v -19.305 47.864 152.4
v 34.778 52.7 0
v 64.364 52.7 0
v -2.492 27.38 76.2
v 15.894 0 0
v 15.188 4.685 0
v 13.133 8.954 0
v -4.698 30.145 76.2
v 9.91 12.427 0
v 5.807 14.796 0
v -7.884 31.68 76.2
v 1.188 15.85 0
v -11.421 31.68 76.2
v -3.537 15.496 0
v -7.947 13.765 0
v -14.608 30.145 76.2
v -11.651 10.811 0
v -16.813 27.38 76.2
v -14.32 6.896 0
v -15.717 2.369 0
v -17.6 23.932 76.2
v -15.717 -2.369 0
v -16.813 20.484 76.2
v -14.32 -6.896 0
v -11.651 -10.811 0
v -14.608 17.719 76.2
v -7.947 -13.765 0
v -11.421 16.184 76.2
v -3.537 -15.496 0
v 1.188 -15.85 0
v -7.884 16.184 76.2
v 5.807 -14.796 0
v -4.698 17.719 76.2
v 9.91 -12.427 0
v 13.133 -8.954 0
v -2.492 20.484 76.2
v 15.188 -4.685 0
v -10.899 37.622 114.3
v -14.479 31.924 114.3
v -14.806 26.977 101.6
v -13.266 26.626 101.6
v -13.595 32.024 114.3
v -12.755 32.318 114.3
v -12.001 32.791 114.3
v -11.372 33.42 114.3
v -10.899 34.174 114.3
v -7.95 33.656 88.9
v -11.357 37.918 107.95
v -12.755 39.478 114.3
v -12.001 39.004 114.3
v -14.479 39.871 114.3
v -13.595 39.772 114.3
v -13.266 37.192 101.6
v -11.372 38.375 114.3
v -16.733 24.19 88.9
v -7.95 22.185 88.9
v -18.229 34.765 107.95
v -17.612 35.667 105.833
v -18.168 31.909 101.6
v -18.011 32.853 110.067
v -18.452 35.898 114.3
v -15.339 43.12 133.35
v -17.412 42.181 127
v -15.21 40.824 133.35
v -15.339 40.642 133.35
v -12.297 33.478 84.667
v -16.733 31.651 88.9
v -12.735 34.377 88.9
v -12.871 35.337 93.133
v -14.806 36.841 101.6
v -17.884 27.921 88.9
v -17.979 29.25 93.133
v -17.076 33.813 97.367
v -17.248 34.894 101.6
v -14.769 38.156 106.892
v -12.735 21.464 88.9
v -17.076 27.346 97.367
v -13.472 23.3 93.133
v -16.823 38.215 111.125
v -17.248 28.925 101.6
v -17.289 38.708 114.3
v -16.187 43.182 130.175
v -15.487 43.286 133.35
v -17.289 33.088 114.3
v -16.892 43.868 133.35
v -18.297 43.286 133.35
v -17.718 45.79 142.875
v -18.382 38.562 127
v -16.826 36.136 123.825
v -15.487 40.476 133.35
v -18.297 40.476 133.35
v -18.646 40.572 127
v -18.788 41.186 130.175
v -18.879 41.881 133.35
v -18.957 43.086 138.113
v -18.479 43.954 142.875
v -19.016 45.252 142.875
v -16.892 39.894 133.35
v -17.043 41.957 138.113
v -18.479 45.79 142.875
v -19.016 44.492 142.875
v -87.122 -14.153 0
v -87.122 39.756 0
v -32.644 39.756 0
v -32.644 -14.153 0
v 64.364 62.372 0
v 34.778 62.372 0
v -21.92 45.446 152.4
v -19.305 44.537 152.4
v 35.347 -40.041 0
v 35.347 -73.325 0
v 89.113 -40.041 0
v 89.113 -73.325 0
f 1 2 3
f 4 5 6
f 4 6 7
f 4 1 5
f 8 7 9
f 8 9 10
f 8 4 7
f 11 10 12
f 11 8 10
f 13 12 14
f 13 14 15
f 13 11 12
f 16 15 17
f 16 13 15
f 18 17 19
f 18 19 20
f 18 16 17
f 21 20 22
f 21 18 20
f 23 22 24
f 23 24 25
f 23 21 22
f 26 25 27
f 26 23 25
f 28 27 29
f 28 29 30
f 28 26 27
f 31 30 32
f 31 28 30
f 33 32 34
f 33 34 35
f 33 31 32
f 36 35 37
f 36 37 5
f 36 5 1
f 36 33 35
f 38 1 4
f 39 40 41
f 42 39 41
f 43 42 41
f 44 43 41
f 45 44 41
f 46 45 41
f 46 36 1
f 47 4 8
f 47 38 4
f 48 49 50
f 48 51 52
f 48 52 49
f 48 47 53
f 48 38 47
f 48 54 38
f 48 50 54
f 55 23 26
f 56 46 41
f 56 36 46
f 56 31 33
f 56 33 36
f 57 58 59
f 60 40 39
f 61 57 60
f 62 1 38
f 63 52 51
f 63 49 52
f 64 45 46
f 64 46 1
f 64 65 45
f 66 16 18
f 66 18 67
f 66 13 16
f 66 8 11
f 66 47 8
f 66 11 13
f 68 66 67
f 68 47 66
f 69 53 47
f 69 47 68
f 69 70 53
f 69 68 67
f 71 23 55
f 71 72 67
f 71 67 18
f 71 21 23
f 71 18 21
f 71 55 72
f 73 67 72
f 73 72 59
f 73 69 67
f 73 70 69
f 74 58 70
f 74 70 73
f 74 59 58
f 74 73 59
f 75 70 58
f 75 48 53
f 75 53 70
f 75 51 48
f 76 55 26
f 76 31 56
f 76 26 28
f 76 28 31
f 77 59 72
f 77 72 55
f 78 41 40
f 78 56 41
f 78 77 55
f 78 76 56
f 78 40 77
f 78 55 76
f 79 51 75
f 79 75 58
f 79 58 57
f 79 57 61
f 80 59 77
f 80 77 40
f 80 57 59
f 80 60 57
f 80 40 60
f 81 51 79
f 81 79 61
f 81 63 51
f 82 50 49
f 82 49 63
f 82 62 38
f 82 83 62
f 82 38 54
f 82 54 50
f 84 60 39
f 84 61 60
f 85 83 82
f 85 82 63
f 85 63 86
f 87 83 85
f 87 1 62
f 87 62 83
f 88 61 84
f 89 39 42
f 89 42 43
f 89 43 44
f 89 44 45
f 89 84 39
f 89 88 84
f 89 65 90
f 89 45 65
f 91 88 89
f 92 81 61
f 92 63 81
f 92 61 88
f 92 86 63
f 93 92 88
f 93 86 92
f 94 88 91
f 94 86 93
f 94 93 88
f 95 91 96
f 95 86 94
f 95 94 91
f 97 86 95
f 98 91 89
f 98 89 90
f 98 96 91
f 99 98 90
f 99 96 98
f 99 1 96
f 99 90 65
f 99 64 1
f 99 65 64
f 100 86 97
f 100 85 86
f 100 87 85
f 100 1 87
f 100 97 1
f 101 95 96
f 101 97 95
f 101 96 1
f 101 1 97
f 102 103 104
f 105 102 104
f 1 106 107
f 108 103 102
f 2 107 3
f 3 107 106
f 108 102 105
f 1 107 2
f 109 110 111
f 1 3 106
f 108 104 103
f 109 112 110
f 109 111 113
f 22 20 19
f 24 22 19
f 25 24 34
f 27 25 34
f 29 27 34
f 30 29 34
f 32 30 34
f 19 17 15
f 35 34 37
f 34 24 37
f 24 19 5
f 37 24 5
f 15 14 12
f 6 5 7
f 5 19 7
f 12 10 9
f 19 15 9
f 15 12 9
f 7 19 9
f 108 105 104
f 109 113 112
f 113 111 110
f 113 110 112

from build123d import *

# Parameters (mm, degrees)
F0_W   = 53.766724
F0_H   = 33.284154
F0_W_2 = 54.477919
F0_H_2 = 53.908958
F0_R   = 15.894327
F0_W_3 = 29.585917
F0_H_3 = 9.672321


with BuildPart() as f3:
    # F0 (on Top) → F3 section 0
    with BuildSketch(Plane.XY, mode=Mode.PRIVATE) as f3_s0:
        with Locations((62.23, -56.682641)):
            Rectangle(F0_W, F0_H)
    loft([f3_s0.sketch, Vertex(-19.305075, 44.537269, 152.4)])


with BuildPart() as f4:
    # F0 (on Top) → F4 section 0
    with BuildSketch(Plane.XY, mode=Mode.PRIVATE) as f4_s0:
        with Locations((-59.883041, 12.801599)):
            Rectangle(F0_W_2, F0_H_2)
    loft([f4_s0.sketch, Vertex(-21.920199, 45.445681, 152.4)])


with BuildPart() as f5:
    # F0 (on Top) → F5 section 0
    with BuildSketch(Plane.XY, mode=Mode.PRIVATE) as f5_s0:
        Circle(F0_R)
    loft([f5_s0.sketch, Vertex(-19.305075, 47.863759, 152.4)])


with BuildPart() as f6:
    # F0 (on Top) → F6 section 0
    with BuildSketch(Plane.XY, mode=Mode.PRIVATE) as f6_s0:
        with Locations((49.57064, 57.53608)):
            Rectangle(F0_W_3, F0_H_3)
    loft([f6_s0.sketch, Vertex(-19.305075, 47.863759, 152.4)])


solid = Compound([f3.part, f4.part, f5.part, f6.part])
